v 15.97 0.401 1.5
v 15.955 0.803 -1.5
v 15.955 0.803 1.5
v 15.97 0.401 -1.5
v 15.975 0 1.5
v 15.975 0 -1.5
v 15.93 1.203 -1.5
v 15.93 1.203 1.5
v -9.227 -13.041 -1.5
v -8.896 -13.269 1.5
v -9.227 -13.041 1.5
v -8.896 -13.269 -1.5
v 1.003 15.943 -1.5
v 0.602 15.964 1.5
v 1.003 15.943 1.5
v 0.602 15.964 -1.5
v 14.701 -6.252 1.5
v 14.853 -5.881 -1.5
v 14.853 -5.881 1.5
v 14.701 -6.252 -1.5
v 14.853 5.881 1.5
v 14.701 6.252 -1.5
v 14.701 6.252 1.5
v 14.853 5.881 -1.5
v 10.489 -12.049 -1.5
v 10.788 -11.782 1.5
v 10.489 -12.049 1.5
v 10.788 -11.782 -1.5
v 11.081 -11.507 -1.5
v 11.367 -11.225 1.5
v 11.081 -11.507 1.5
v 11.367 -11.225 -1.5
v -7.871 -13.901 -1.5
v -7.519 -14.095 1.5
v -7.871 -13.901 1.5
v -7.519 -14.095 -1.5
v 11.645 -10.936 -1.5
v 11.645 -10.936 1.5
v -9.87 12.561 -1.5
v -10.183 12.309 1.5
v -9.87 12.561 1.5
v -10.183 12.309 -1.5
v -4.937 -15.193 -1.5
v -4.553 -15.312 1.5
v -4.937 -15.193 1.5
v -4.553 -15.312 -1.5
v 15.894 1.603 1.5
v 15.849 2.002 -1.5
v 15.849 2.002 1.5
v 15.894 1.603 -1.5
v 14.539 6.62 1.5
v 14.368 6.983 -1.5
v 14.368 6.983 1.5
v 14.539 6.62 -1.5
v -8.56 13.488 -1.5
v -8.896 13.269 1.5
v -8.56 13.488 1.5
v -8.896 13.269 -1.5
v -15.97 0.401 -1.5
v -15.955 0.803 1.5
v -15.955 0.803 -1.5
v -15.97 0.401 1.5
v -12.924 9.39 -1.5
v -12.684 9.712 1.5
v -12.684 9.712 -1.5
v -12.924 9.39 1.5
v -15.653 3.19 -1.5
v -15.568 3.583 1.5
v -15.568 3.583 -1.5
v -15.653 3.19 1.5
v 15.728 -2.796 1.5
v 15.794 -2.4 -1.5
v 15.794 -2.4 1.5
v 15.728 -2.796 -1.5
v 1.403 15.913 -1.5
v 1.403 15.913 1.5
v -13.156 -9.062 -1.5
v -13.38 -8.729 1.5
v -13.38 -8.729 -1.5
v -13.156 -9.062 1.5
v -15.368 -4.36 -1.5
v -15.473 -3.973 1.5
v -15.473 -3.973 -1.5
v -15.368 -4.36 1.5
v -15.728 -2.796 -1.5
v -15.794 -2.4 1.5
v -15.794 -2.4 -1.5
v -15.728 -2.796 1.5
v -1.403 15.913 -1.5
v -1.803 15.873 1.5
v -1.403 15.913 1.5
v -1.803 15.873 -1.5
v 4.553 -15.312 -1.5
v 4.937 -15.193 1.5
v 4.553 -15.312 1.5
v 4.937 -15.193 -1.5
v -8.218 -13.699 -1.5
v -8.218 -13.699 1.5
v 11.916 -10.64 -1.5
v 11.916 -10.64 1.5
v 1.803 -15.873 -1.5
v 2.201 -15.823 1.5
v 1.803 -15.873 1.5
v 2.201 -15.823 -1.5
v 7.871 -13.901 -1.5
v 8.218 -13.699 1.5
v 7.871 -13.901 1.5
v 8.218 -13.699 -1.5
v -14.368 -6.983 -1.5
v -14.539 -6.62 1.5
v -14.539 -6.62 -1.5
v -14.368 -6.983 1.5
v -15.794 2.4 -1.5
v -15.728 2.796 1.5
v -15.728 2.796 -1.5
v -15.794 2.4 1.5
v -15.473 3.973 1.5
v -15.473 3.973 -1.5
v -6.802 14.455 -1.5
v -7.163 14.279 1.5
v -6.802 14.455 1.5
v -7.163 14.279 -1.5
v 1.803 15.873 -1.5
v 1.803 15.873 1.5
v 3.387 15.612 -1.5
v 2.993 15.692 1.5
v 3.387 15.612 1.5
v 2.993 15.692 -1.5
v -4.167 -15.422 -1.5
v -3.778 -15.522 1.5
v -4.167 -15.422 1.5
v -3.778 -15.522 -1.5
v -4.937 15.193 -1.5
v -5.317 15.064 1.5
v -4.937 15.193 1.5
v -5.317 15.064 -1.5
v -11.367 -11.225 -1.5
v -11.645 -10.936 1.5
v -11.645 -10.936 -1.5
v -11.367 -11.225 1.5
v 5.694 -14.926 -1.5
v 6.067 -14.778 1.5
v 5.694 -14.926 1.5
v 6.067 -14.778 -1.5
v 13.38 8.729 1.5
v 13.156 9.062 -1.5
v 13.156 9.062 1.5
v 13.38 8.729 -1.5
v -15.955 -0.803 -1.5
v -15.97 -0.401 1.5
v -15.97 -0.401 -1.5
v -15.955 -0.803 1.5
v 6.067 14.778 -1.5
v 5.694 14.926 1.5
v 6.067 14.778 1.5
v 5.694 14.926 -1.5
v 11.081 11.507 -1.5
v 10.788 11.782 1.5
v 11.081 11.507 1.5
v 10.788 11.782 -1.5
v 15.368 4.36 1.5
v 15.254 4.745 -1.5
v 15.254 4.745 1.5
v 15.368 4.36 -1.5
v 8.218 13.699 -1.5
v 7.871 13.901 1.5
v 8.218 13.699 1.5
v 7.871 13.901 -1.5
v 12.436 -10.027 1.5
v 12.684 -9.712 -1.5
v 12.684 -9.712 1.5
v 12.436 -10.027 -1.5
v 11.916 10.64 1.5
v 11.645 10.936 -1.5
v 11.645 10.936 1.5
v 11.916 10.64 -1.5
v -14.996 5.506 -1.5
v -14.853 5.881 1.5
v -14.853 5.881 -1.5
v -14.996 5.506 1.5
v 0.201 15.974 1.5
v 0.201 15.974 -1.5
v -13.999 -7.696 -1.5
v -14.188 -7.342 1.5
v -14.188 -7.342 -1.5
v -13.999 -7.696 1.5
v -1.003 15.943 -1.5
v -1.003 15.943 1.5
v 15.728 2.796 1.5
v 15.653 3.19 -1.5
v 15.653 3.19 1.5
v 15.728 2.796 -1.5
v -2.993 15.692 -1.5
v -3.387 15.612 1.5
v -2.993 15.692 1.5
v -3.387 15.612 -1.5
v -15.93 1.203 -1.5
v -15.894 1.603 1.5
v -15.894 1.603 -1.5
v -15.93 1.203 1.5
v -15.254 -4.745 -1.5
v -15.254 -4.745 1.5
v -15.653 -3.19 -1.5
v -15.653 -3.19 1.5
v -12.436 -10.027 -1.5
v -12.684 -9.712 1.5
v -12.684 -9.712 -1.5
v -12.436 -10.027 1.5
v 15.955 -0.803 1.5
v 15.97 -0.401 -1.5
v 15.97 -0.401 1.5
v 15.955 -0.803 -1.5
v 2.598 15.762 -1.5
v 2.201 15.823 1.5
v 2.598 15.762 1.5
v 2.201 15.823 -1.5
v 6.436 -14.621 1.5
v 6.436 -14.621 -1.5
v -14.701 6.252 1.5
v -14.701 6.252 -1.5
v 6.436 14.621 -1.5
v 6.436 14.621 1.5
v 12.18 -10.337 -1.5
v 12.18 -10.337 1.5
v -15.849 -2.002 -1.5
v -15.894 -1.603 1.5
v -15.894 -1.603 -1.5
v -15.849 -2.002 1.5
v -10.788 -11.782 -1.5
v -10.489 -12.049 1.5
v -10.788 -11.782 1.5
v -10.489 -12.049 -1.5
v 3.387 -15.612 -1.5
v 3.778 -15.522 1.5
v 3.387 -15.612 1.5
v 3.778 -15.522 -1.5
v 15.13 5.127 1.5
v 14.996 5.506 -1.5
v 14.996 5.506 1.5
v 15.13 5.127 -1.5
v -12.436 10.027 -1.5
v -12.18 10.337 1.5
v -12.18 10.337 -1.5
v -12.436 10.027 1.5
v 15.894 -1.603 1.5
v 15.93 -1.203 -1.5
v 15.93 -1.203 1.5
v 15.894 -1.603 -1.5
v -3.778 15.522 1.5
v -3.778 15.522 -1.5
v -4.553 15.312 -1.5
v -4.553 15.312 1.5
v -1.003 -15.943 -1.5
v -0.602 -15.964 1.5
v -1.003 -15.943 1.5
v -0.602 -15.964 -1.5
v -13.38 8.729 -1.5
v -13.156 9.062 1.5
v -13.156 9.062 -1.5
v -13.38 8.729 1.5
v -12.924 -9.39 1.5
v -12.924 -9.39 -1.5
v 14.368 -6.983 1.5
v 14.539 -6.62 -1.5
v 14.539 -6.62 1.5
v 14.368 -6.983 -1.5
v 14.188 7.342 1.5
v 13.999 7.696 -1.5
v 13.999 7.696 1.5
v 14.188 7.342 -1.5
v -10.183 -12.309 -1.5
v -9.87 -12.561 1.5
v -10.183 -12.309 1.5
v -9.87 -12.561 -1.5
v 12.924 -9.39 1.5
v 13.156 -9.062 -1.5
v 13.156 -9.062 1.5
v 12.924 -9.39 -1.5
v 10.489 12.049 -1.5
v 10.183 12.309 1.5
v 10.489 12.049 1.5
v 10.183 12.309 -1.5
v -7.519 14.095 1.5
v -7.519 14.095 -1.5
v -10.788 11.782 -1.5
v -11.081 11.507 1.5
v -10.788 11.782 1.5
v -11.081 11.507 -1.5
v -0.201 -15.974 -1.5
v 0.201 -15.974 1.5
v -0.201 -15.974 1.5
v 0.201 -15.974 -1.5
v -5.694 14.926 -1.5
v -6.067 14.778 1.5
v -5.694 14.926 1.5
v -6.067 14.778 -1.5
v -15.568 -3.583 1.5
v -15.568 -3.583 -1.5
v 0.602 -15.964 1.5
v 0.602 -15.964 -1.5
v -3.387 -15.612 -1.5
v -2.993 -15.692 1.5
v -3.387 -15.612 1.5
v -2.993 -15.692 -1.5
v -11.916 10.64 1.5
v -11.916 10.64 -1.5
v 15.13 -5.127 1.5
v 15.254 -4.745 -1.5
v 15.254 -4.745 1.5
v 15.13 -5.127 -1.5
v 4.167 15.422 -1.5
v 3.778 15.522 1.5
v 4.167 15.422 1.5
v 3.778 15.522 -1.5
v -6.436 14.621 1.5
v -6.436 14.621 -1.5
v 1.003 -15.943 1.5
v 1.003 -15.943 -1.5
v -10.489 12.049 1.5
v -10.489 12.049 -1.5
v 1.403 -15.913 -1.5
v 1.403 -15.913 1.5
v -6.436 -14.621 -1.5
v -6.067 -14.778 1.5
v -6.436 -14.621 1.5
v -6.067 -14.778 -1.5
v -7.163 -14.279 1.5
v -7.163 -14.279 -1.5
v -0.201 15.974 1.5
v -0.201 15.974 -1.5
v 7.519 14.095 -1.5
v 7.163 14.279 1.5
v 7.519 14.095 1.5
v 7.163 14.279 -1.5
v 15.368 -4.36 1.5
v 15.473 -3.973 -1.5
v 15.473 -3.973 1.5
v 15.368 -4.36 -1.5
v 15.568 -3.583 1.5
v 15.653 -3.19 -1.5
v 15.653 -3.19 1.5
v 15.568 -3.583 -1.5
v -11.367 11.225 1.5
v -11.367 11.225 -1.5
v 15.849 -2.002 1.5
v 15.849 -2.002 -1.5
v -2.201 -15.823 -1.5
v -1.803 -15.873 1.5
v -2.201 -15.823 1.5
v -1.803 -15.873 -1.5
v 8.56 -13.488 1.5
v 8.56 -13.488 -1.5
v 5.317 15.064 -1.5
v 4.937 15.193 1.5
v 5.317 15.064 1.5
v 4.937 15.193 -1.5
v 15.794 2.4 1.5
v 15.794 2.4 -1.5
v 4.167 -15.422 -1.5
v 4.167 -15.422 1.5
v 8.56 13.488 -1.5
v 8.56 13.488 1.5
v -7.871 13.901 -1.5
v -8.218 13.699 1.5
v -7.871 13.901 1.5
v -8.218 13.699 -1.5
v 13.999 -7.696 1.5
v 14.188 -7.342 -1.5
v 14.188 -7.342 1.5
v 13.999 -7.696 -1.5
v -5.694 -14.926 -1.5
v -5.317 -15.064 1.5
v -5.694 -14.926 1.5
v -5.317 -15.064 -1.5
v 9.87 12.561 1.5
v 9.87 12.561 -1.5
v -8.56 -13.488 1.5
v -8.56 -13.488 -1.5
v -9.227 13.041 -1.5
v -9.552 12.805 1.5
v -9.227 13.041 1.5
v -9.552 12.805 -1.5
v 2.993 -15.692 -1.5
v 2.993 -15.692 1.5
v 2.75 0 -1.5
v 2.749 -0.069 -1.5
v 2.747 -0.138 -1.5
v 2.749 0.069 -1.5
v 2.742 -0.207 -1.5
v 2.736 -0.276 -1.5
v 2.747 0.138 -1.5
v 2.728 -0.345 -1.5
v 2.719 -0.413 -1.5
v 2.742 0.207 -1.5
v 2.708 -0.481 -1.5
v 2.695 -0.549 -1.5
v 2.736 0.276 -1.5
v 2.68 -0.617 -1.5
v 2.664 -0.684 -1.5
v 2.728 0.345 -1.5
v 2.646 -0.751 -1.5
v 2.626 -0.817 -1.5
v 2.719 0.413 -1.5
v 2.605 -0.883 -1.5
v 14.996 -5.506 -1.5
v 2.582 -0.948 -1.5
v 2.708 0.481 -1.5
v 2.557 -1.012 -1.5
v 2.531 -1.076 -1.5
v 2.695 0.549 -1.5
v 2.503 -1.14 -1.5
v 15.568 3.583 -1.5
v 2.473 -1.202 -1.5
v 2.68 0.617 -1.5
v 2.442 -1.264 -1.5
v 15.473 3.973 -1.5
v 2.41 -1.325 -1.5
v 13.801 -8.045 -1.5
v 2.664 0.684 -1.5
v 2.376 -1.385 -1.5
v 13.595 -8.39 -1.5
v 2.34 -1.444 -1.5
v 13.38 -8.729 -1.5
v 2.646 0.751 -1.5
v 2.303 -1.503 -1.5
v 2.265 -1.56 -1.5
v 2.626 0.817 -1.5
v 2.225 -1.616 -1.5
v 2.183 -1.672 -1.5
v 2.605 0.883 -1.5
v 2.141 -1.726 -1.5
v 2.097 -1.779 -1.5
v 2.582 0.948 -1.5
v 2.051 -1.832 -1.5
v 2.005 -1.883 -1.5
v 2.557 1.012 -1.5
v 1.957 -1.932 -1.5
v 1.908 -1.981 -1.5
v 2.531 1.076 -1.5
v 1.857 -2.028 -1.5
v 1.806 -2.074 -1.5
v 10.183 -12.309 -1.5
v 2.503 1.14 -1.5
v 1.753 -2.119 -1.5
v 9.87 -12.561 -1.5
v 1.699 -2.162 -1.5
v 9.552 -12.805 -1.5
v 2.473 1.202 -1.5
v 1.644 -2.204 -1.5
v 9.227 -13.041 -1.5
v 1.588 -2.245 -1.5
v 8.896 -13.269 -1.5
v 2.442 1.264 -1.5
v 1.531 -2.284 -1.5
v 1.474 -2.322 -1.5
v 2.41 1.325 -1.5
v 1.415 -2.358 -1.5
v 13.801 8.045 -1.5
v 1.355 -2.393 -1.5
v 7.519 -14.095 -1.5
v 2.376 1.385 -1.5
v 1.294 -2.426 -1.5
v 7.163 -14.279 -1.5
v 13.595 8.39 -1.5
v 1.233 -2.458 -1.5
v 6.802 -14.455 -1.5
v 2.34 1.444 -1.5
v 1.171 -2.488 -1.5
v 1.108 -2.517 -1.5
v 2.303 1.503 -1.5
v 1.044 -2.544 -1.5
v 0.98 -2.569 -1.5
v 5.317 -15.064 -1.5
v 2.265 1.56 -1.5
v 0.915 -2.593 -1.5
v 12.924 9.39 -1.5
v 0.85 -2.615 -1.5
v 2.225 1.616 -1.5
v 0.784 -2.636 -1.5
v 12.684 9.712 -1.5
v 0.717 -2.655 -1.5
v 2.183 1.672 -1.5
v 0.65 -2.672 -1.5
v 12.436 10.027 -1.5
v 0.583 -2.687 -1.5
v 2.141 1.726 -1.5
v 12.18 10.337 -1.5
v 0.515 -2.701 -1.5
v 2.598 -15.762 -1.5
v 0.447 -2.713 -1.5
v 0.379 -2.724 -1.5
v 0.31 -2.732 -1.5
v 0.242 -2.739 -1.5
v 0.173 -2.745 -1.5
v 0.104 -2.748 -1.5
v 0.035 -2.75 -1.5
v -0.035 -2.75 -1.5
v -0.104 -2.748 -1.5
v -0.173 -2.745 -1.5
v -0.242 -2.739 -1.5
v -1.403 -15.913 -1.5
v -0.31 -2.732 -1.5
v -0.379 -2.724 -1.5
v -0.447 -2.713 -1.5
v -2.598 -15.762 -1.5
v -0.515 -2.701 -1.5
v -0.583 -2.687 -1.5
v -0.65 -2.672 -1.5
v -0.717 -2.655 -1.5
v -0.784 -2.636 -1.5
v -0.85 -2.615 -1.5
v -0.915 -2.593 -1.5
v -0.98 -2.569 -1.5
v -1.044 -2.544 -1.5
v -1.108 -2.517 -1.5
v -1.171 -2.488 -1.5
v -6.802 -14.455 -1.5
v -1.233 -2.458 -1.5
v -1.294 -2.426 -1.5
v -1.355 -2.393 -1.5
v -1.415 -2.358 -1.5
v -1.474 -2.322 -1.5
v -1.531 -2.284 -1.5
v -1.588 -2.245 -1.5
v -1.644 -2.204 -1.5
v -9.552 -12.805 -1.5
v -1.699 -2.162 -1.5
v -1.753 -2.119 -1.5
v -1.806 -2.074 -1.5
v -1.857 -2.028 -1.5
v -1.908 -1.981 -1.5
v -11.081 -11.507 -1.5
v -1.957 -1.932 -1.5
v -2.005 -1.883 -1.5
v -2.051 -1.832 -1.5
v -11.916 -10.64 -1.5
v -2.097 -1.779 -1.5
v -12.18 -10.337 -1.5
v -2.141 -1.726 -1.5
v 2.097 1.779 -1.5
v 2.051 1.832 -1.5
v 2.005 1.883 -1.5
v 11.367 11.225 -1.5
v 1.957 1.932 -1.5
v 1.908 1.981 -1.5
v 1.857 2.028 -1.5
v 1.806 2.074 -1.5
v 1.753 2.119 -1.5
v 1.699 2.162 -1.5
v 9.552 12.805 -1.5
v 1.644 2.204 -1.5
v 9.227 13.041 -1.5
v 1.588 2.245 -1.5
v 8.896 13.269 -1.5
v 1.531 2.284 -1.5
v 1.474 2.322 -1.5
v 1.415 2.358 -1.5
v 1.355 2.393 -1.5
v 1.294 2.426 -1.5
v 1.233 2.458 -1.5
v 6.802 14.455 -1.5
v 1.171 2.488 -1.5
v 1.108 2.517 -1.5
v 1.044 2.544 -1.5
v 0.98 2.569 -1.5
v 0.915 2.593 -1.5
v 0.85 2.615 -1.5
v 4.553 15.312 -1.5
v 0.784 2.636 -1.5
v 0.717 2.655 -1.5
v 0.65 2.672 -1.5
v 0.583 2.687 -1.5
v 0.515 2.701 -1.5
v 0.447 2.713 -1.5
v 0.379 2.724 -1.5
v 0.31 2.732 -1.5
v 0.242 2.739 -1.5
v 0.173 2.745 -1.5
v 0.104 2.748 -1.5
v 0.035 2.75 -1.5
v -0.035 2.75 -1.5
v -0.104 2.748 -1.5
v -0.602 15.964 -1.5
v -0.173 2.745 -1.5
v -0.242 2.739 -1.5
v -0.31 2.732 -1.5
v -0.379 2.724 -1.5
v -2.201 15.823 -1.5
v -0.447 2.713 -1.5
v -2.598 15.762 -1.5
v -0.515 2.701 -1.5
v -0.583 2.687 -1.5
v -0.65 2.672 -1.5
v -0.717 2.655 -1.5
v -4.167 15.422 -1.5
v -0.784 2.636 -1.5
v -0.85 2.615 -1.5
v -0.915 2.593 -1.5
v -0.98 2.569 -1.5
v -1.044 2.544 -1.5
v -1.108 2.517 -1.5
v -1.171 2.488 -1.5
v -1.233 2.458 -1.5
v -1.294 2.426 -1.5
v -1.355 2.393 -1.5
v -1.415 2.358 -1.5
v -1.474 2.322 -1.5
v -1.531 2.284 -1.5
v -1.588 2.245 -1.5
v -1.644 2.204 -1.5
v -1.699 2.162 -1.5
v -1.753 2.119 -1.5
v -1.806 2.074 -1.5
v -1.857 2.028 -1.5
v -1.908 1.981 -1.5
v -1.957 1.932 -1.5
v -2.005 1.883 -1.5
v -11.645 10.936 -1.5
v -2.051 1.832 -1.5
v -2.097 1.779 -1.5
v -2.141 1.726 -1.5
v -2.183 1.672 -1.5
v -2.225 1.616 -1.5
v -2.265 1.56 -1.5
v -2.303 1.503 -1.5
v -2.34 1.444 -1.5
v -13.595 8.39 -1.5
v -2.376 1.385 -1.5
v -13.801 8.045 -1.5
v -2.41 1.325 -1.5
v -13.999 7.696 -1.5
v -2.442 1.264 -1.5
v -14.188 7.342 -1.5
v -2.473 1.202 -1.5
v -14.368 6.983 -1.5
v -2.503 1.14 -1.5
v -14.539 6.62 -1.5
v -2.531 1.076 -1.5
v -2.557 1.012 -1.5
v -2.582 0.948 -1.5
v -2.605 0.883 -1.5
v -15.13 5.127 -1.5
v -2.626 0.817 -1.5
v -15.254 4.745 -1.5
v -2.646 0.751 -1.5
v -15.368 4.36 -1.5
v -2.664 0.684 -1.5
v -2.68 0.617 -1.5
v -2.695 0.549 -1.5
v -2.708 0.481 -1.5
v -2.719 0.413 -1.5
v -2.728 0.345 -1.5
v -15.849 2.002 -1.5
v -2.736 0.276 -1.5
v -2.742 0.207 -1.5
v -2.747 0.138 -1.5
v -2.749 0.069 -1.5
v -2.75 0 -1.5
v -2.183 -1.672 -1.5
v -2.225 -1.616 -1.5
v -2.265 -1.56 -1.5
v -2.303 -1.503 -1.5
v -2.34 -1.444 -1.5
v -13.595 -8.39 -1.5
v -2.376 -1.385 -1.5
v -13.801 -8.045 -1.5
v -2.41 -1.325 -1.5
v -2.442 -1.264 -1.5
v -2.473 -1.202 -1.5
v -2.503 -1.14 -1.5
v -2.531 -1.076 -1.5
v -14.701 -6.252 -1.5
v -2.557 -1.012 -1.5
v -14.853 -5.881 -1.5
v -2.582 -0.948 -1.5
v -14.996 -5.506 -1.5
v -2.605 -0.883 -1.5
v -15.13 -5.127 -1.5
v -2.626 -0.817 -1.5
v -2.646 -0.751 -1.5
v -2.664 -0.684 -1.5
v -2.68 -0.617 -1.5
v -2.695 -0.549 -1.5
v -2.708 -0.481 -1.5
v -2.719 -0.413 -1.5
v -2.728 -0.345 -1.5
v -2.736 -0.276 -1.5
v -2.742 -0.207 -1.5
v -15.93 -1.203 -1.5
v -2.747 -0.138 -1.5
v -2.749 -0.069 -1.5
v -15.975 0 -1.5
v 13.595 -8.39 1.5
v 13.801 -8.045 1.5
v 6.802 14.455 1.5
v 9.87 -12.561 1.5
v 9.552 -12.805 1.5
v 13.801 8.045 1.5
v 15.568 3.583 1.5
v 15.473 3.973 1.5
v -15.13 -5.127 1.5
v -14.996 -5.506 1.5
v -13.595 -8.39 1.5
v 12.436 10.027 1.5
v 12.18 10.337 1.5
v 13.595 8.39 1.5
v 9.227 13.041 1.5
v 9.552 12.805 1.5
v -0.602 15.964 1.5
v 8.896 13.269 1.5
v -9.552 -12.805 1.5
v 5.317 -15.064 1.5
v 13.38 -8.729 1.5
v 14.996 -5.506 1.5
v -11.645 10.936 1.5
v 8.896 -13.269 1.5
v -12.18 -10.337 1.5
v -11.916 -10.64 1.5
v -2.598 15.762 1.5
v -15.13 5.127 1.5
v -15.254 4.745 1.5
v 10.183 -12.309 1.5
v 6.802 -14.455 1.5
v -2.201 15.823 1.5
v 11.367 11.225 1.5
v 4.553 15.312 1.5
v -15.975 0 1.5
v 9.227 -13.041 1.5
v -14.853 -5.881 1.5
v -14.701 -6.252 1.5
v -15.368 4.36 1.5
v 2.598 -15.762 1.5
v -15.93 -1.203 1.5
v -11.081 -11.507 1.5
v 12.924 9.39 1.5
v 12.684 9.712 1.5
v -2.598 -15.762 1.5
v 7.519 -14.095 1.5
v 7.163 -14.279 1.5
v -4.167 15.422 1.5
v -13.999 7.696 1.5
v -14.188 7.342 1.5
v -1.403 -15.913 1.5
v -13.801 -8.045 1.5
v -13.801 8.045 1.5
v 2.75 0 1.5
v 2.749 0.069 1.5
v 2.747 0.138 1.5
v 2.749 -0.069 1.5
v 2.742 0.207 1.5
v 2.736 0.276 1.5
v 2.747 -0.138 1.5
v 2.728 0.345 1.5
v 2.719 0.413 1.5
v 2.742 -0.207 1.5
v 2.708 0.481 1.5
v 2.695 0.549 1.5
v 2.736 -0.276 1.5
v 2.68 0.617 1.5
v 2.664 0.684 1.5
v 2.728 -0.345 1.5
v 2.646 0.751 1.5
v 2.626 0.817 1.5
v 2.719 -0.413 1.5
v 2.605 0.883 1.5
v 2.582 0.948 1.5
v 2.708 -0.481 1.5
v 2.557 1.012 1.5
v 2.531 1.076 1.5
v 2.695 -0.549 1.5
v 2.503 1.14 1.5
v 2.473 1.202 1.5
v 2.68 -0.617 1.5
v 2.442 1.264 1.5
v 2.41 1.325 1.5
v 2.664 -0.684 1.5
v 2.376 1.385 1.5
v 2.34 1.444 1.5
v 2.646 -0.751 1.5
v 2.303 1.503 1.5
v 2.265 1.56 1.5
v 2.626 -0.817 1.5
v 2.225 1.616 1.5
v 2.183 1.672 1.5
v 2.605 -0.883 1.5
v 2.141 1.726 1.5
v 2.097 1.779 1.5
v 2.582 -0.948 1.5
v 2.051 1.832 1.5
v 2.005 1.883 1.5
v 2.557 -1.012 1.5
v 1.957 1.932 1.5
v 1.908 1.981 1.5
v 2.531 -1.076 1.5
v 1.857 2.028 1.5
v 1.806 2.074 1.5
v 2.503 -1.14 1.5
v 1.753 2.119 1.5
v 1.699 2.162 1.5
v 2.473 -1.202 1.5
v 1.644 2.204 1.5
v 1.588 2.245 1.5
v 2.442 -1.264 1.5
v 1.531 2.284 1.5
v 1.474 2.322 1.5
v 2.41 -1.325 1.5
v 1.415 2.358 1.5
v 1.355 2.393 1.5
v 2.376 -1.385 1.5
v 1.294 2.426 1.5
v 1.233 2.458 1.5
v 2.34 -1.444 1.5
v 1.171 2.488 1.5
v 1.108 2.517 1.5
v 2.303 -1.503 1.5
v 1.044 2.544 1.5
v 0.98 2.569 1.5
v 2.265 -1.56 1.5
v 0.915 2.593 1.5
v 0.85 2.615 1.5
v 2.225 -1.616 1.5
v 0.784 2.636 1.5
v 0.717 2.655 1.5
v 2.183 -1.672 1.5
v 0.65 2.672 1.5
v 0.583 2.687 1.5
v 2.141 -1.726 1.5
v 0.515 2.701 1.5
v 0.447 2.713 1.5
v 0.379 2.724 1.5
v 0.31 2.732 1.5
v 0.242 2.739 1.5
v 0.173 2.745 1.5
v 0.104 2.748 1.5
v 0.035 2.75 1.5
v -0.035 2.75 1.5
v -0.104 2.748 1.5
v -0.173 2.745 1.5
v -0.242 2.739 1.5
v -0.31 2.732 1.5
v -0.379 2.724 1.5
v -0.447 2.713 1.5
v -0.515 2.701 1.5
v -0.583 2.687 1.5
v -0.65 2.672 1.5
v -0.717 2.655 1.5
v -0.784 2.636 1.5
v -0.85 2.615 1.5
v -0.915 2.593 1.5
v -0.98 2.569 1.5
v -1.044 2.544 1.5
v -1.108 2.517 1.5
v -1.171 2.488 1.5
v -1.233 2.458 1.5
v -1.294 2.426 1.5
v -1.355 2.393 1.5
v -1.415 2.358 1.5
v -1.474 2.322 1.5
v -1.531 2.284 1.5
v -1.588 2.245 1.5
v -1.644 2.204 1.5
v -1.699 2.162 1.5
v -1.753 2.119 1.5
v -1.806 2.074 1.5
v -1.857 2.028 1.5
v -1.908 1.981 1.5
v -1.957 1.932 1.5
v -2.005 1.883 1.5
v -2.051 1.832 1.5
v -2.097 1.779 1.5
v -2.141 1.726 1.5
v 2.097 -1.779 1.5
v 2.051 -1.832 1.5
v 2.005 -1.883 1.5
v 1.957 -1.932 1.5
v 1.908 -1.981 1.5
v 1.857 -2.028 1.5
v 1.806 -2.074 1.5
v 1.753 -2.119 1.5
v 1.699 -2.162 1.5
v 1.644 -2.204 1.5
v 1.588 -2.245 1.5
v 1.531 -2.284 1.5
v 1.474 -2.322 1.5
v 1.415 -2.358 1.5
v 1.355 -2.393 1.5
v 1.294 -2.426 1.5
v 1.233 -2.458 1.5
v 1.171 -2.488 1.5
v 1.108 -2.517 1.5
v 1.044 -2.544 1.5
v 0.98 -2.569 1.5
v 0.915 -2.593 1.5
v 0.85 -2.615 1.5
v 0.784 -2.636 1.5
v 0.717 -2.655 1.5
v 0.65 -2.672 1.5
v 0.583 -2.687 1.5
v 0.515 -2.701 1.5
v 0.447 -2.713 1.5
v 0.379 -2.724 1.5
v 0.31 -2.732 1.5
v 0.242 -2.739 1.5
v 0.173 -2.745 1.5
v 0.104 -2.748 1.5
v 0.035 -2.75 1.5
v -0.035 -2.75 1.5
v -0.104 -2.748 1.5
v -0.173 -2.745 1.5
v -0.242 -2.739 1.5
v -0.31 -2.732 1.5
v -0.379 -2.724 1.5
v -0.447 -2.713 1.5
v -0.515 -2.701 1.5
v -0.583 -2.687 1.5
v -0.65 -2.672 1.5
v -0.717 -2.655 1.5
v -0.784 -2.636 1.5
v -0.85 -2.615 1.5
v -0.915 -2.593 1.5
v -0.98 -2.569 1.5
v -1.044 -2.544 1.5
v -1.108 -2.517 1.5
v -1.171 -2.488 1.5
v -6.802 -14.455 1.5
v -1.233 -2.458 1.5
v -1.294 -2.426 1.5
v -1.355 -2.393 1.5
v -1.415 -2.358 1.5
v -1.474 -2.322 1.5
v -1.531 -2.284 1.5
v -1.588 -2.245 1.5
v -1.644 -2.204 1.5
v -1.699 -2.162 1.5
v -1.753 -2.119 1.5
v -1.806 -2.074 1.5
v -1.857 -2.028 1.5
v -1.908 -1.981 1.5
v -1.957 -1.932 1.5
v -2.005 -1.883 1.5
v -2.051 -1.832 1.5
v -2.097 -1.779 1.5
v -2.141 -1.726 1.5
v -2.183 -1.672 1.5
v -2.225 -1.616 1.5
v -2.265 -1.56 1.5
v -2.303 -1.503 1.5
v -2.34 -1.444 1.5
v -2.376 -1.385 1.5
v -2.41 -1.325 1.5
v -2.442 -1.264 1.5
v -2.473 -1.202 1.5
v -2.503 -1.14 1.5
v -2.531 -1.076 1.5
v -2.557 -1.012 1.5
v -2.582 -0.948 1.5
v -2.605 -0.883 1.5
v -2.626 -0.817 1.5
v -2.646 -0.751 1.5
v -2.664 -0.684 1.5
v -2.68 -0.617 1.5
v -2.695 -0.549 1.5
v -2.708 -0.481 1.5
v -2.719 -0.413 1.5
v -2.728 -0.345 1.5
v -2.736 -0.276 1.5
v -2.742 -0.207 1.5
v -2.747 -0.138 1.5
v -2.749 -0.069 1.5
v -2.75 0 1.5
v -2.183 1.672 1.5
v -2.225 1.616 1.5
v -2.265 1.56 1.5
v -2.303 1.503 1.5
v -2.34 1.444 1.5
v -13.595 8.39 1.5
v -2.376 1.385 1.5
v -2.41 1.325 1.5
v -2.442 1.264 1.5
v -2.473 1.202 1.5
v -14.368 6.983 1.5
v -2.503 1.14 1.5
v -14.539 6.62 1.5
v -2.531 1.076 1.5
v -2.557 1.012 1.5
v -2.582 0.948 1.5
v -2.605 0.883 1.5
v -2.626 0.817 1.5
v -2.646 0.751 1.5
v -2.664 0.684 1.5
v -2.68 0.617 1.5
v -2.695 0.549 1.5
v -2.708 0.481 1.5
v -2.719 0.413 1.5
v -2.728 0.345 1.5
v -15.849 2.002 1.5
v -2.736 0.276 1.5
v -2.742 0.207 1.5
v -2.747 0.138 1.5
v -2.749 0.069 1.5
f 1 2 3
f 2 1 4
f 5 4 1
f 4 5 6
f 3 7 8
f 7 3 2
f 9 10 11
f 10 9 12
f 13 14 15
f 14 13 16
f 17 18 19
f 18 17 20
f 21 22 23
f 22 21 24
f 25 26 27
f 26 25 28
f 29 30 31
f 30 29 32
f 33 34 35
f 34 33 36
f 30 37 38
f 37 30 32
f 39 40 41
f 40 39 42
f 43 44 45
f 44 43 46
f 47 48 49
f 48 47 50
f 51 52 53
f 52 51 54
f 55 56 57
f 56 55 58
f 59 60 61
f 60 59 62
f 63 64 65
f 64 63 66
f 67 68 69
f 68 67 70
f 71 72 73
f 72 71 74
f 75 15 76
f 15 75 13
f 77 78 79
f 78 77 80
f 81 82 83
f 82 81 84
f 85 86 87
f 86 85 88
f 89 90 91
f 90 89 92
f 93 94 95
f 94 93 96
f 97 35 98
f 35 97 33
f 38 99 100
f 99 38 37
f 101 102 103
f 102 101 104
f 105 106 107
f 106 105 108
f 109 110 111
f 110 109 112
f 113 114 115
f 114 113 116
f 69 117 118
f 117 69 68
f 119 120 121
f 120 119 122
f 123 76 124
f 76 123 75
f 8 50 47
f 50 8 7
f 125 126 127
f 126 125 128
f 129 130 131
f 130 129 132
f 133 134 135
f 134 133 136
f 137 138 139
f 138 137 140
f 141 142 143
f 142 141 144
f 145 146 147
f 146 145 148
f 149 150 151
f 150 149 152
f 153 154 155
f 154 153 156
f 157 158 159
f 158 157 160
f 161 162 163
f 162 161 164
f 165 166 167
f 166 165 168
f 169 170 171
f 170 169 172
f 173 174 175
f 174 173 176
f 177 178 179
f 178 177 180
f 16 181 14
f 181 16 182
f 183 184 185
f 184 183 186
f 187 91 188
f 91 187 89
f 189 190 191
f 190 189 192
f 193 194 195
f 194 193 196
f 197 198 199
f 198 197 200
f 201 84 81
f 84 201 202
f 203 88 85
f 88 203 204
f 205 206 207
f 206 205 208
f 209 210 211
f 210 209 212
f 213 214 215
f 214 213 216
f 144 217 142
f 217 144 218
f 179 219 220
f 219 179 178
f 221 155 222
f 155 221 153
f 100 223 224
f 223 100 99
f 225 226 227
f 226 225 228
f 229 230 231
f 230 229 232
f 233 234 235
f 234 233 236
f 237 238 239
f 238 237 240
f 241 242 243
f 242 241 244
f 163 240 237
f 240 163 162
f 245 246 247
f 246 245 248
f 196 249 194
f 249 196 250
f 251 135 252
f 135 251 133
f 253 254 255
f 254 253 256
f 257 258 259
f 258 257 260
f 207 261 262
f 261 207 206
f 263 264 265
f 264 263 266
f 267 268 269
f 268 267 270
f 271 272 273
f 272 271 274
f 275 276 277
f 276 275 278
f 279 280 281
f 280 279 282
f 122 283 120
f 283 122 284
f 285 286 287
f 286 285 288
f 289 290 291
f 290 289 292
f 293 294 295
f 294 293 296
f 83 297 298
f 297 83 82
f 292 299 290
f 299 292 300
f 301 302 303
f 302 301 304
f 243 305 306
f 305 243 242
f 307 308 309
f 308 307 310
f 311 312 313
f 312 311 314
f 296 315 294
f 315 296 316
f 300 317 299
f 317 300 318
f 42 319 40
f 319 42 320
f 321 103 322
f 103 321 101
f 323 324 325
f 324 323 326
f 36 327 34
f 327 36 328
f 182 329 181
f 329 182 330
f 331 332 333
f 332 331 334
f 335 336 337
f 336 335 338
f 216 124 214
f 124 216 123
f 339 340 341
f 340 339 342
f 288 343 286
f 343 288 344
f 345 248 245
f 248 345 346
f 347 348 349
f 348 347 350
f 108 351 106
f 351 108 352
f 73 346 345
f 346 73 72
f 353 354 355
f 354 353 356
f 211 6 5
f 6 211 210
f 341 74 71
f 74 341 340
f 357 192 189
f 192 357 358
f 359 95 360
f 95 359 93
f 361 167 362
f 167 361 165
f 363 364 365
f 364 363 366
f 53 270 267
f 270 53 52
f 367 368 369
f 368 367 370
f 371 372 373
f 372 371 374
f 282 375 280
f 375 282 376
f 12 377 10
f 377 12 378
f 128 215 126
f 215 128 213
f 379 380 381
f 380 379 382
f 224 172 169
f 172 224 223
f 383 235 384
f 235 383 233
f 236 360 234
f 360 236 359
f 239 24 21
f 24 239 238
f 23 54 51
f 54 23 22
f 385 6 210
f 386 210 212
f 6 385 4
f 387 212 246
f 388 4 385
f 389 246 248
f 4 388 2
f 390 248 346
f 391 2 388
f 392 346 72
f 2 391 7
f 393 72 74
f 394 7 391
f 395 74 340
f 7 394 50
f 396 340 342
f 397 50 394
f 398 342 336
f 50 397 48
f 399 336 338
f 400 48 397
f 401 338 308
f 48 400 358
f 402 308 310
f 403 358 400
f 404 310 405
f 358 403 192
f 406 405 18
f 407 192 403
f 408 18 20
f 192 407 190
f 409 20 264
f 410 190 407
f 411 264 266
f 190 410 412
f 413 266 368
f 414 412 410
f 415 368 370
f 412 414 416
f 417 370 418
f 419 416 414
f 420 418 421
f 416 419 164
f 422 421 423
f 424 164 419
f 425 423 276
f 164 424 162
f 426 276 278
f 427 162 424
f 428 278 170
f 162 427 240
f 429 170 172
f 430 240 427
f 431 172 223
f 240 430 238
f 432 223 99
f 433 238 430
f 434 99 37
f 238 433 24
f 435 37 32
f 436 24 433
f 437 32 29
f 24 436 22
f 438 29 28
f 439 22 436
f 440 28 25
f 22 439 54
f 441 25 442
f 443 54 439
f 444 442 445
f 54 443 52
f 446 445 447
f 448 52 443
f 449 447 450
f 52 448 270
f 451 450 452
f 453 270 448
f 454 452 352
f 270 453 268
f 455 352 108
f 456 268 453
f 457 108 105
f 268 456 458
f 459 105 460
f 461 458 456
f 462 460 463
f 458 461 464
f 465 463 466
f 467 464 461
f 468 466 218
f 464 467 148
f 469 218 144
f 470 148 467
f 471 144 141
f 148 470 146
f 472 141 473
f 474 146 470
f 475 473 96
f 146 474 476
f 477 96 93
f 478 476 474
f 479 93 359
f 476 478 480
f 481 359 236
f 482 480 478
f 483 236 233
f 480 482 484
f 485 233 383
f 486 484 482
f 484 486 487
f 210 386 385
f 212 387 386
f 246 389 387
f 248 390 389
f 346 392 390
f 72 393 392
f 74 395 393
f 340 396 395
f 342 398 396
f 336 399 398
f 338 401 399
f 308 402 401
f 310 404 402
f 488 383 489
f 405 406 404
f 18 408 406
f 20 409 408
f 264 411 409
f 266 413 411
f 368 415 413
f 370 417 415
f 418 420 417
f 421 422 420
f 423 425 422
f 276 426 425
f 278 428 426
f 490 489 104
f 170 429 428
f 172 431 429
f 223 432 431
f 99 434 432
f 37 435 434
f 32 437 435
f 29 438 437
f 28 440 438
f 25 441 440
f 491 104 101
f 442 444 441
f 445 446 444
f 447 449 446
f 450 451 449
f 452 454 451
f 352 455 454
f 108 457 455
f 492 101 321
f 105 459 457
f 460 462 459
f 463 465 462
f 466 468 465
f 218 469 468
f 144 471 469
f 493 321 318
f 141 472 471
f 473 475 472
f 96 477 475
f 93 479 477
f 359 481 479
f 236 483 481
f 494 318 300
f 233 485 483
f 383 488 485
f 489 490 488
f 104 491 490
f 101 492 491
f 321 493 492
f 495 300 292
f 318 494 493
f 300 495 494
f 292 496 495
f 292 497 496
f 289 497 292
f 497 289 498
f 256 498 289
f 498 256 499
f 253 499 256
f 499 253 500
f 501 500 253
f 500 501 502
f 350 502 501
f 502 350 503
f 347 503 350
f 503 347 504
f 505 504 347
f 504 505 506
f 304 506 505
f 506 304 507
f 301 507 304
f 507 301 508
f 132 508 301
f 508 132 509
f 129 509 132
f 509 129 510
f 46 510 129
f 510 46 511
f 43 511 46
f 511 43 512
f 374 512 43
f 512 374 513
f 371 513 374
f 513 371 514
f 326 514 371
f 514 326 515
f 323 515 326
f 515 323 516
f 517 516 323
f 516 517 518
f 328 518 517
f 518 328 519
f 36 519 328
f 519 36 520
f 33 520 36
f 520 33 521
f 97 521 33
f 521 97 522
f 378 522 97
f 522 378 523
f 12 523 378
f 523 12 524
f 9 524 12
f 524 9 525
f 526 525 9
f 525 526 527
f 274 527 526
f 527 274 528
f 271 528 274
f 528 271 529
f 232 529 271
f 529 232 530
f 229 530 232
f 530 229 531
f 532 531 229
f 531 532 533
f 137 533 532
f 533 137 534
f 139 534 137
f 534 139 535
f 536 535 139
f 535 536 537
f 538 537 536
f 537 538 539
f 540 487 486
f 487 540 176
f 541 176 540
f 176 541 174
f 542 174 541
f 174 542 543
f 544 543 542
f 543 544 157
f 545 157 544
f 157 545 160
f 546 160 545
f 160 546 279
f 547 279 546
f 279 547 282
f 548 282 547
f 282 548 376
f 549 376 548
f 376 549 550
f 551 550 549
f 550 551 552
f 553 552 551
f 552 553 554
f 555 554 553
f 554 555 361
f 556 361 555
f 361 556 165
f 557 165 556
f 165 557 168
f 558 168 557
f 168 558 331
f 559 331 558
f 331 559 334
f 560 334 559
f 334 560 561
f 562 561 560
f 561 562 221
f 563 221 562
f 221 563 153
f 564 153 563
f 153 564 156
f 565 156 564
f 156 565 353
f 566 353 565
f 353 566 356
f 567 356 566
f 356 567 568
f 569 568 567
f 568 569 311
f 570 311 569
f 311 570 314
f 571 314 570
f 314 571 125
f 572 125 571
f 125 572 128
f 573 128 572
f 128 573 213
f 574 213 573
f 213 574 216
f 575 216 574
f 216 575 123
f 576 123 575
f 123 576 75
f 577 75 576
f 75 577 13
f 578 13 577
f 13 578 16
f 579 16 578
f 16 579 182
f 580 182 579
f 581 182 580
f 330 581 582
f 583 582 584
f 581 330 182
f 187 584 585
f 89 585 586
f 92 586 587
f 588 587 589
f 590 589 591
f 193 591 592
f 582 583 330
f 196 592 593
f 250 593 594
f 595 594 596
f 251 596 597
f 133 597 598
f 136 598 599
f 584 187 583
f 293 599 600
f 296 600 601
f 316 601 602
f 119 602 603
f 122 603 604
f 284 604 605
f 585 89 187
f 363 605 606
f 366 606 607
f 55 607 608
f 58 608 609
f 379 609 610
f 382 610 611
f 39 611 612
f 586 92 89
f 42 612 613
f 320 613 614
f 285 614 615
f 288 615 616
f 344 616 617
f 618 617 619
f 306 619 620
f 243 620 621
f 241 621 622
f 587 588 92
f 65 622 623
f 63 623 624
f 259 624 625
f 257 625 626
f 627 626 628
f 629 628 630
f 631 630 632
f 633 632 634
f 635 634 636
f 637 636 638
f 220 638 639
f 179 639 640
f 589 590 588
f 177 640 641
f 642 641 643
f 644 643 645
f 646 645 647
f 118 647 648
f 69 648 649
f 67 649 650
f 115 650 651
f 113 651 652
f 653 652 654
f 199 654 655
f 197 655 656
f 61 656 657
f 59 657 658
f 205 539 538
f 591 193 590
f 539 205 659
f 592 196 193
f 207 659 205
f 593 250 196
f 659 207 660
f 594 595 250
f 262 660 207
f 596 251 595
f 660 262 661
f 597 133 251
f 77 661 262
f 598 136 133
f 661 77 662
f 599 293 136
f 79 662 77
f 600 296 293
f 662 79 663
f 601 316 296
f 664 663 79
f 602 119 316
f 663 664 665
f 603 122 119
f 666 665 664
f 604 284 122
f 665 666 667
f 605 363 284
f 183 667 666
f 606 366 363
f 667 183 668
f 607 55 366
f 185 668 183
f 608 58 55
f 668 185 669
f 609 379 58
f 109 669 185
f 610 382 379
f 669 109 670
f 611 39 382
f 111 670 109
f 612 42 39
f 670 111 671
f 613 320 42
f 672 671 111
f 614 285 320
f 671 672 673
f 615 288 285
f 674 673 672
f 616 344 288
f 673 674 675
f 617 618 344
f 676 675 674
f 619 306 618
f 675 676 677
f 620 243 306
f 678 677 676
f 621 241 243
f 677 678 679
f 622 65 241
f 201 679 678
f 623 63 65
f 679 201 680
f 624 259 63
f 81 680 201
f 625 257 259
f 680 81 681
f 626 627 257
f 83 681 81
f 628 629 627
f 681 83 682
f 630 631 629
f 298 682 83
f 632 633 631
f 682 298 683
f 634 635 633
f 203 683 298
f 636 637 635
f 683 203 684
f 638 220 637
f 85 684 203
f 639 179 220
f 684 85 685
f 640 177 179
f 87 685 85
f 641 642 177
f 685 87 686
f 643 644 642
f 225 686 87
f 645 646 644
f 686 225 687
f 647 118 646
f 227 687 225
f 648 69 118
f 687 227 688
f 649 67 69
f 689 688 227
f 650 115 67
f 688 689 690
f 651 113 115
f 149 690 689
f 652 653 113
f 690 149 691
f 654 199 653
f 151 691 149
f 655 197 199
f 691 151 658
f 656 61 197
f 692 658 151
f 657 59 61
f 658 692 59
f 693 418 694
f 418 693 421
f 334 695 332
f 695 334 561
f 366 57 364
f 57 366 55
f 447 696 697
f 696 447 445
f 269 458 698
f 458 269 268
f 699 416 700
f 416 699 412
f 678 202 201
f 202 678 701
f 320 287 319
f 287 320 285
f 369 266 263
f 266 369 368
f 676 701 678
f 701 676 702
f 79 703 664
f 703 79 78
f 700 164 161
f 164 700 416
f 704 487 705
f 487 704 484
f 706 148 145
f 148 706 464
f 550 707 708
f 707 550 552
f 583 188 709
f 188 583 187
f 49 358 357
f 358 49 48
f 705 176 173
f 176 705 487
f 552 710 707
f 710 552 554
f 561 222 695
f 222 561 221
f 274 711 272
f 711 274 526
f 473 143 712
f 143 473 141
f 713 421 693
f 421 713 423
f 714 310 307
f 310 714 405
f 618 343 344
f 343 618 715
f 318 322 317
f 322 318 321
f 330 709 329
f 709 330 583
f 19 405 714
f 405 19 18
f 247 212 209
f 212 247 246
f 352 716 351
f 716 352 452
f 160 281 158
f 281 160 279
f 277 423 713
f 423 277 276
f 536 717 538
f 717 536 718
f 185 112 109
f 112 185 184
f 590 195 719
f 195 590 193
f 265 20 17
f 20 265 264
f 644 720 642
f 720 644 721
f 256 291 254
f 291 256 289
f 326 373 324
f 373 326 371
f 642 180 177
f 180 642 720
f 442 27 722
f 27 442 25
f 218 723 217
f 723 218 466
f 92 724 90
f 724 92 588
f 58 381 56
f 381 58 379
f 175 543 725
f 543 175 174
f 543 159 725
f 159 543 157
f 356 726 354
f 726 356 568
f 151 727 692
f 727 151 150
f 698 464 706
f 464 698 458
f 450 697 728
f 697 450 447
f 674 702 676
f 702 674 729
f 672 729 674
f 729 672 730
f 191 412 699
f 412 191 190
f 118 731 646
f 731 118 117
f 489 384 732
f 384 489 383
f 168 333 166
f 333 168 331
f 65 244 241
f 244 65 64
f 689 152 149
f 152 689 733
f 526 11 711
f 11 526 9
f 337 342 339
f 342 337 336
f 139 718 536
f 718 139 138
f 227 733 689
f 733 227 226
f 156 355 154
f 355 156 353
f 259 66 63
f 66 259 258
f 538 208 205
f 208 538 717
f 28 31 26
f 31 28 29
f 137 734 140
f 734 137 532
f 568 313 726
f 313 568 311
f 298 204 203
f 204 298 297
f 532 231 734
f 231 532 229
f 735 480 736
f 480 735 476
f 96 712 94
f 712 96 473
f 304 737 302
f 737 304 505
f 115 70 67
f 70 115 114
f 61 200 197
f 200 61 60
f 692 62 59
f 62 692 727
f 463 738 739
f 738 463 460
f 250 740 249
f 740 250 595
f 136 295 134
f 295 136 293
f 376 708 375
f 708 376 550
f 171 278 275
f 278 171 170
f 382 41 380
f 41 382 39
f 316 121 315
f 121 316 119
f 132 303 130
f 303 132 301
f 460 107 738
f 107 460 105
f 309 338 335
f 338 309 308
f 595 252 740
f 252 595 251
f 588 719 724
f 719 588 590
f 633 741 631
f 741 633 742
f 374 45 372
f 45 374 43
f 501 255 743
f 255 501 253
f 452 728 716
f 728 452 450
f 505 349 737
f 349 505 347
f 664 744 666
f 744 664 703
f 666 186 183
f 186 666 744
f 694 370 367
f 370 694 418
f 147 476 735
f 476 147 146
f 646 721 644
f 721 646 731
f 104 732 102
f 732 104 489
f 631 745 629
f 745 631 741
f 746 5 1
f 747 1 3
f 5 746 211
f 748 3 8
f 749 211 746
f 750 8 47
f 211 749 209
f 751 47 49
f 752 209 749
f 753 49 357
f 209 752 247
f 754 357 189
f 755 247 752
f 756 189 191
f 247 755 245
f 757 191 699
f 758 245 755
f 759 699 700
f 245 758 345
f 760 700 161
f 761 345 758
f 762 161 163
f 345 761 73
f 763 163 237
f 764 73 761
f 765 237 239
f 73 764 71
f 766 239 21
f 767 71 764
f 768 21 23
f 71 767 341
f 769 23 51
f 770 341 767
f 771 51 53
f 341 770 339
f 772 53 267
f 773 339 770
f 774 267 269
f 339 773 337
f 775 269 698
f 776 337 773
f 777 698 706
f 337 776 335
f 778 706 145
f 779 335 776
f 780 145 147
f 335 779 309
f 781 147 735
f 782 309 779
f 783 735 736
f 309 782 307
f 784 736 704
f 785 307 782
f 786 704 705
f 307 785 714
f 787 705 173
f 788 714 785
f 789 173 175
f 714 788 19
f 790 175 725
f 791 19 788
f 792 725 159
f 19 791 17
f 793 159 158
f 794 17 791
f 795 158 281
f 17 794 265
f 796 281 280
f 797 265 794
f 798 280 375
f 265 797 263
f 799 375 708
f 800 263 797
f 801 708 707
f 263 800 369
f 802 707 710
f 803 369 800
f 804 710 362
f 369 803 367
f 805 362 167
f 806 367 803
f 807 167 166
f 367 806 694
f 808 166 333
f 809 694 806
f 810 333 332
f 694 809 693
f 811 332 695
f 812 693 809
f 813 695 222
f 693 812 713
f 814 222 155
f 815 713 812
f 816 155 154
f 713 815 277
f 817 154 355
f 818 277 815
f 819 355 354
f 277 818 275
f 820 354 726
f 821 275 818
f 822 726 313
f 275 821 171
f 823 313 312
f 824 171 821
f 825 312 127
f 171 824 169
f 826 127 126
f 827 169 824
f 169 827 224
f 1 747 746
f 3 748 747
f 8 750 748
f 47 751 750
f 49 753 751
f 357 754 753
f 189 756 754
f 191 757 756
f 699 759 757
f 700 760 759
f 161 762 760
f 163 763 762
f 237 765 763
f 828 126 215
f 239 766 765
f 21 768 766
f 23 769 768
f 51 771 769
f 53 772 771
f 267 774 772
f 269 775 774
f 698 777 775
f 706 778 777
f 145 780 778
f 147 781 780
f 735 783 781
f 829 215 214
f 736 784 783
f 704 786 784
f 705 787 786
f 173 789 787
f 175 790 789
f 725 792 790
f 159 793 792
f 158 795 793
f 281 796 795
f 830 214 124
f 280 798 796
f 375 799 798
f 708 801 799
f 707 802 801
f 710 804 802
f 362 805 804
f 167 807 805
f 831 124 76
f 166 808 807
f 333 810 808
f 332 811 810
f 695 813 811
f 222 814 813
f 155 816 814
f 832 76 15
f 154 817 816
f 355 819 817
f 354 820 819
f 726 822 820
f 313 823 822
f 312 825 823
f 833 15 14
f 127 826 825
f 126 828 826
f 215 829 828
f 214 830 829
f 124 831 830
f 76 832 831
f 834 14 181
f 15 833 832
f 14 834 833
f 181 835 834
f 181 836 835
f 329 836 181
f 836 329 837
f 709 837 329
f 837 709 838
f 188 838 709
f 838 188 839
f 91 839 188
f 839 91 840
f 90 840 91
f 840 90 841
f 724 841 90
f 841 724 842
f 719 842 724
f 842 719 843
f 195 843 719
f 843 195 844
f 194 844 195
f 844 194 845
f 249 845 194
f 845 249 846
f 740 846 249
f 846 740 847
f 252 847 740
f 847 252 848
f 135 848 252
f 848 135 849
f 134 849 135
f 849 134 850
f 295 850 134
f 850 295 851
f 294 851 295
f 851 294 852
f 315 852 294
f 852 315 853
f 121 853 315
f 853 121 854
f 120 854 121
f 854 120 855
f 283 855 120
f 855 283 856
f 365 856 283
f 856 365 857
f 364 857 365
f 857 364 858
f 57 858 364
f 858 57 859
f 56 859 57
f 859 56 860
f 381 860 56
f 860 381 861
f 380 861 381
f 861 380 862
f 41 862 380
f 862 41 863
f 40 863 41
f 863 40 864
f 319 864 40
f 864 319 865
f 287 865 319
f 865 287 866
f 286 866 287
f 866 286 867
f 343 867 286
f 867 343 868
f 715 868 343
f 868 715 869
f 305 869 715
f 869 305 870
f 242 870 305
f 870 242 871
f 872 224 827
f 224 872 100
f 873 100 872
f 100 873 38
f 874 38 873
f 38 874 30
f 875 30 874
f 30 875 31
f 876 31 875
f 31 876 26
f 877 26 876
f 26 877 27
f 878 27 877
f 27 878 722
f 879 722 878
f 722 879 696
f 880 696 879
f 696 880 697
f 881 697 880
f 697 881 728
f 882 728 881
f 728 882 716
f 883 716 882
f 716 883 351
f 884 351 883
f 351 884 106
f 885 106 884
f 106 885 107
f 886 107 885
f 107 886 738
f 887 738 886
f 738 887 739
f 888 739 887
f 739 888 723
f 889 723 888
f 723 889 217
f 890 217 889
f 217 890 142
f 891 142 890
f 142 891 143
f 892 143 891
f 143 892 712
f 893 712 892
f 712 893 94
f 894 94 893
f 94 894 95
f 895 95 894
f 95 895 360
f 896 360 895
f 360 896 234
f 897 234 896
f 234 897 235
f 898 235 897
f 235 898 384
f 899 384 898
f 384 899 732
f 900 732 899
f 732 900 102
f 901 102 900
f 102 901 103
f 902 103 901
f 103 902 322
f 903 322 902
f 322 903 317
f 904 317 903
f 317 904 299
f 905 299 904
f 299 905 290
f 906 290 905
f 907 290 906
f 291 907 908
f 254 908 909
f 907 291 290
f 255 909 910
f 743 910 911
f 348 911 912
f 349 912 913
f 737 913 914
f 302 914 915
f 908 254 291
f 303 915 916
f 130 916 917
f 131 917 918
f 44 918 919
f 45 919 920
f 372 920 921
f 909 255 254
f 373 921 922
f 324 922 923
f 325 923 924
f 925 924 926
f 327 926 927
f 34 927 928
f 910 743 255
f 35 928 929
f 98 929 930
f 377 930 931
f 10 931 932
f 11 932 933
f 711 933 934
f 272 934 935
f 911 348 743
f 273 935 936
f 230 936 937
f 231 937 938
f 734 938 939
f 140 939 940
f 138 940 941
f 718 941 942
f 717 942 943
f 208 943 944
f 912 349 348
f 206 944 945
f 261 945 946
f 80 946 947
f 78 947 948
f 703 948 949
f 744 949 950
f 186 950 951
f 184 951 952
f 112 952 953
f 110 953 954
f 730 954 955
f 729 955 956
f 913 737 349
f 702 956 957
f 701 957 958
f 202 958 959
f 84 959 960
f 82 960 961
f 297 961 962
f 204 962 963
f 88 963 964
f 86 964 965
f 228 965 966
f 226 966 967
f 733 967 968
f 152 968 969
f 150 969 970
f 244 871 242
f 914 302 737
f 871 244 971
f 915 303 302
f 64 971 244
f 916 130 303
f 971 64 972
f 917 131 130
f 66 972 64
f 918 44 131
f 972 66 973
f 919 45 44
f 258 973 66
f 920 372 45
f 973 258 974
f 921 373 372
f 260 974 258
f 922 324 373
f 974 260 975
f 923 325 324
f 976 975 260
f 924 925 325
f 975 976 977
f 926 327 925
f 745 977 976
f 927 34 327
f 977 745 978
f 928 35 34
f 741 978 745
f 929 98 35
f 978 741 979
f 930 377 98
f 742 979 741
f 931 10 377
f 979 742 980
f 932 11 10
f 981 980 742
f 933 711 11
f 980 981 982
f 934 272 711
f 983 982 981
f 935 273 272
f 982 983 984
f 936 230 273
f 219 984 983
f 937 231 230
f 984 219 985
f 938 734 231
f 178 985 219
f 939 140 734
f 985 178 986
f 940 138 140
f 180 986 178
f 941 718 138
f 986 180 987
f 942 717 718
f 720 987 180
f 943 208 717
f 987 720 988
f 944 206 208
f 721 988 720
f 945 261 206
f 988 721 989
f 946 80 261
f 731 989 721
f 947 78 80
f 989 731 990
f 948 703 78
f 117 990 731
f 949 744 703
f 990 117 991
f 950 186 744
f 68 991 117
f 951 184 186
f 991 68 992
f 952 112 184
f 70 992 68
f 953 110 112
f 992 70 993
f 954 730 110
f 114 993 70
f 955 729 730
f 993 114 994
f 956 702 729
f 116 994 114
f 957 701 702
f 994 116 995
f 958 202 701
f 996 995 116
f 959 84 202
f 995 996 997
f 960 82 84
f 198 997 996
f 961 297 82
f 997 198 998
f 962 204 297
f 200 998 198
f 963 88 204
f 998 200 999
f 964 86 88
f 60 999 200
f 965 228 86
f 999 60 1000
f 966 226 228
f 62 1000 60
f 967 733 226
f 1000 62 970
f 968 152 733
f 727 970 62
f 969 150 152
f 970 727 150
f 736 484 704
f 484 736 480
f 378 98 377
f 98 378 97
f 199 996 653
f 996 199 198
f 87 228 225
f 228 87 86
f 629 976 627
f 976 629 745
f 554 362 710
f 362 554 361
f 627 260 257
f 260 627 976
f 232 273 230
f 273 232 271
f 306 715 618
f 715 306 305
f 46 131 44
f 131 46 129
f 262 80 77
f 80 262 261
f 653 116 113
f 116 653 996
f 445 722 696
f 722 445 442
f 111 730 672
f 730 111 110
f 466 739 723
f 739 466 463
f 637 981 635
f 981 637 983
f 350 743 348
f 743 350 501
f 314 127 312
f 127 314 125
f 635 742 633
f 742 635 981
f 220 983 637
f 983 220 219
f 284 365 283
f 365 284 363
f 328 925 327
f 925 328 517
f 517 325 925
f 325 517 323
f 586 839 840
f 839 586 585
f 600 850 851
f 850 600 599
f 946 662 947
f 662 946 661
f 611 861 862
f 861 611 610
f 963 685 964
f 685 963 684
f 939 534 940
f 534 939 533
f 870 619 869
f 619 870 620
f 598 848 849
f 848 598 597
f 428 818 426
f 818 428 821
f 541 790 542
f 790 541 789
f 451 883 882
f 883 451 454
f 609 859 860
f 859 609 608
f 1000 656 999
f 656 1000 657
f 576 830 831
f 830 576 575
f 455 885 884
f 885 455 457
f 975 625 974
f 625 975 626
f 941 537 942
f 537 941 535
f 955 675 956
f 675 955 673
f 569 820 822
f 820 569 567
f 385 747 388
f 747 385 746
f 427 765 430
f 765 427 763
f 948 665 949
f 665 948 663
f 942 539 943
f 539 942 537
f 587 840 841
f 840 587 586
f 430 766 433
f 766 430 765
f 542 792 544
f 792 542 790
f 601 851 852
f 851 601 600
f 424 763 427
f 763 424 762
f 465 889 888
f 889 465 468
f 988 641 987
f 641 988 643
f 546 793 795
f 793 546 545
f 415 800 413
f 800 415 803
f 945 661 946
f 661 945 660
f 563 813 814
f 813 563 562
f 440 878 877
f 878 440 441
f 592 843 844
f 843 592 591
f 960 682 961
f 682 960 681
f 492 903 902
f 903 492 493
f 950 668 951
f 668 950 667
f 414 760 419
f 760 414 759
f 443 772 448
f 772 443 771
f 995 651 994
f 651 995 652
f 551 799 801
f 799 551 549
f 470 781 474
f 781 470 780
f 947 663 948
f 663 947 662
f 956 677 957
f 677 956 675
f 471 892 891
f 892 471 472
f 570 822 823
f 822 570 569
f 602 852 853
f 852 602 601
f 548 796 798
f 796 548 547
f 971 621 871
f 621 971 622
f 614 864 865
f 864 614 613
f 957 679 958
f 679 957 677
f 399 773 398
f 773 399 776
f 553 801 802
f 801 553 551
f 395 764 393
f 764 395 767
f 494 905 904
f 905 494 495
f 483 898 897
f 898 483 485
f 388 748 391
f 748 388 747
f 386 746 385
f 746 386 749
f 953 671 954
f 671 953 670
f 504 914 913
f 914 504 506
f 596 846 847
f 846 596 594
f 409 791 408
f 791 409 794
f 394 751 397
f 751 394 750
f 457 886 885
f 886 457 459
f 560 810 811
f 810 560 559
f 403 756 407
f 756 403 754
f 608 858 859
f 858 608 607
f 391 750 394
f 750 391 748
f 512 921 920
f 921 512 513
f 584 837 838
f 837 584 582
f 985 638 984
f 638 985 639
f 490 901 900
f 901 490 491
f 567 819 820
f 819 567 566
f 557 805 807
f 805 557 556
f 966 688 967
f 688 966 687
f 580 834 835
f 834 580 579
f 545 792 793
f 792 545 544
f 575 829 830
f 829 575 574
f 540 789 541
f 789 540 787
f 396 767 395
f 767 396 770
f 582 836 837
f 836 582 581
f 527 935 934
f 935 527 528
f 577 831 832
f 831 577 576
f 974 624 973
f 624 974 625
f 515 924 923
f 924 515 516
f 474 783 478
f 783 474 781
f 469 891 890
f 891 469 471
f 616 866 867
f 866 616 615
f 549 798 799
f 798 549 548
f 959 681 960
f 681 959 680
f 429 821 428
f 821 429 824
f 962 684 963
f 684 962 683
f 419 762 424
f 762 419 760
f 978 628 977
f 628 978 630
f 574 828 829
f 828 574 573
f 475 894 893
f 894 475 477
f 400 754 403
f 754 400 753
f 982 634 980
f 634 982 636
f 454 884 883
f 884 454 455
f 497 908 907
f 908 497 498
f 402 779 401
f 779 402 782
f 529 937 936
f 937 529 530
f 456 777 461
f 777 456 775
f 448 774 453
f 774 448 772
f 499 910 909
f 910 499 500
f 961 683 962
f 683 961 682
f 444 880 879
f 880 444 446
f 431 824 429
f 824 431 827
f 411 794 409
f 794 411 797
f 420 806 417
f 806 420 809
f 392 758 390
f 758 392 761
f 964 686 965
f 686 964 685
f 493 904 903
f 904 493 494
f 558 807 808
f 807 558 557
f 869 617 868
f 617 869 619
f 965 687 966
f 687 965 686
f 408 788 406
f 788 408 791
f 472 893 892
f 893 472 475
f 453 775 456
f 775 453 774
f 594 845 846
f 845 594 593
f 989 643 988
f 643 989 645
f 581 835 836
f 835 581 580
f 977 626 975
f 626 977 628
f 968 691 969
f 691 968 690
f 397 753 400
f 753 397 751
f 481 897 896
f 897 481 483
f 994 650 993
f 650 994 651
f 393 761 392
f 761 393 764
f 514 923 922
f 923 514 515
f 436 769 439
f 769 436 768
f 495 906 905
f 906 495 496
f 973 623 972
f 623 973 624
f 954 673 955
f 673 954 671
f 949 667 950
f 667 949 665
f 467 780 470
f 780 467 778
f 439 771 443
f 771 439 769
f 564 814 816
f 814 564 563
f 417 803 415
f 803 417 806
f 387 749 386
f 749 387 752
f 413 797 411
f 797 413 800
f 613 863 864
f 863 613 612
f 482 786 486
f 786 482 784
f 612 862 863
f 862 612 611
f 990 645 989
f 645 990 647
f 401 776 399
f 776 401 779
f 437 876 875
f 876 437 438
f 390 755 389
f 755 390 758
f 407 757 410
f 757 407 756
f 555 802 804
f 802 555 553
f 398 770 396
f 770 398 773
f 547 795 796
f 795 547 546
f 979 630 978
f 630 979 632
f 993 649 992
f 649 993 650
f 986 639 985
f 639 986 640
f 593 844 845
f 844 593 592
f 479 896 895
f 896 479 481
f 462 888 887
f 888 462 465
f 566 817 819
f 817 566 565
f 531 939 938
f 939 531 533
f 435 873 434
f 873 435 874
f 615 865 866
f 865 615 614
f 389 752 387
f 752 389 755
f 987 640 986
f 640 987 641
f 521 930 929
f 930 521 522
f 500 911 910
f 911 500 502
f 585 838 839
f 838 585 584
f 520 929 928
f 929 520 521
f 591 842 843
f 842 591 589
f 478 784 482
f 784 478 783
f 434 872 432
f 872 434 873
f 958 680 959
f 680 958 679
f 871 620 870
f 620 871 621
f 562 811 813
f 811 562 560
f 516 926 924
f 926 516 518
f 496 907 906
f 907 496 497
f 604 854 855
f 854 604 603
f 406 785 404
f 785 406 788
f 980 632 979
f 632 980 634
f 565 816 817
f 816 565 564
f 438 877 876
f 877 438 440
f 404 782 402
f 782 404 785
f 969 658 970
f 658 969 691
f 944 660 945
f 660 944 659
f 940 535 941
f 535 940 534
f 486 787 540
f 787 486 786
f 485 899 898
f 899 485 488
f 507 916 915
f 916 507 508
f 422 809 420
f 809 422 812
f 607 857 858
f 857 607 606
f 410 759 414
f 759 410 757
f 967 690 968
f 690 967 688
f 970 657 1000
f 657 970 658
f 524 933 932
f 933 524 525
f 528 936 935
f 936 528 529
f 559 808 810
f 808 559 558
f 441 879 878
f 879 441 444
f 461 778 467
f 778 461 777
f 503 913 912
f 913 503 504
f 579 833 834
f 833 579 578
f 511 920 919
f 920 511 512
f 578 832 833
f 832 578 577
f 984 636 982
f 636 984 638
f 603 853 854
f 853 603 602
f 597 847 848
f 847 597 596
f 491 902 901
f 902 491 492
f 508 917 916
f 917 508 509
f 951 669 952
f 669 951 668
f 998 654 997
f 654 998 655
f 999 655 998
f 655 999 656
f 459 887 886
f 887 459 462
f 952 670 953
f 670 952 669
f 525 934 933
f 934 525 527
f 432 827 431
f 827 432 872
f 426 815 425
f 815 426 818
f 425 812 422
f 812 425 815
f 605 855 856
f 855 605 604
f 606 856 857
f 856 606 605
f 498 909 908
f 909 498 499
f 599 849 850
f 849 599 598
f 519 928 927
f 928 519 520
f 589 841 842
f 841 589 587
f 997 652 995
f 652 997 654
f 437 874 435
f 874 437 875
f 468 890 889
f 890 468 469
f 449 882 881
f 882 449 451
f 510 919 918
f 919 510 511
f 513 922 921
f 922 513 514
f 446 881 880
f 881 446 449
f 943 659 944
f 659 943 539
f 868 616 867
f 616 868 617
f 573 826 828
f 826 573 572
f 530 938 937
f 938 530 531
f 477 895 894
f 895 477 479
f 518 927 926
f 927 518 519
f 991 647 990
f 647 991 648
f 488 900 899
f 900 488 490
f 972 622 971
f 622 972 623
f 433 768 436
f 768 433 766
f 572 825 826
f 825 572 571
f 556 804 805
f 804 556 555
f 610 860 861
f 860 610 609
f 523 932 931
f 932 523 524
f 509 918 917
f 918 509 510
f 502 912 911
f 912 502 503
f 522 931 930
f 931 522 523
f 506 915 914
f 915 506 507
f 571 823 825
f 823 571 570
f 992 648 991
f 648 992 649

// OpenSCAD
// Model purpose: Simple washer/spacer for the shades mechanism, used to tune axial spacing and reduce friction or wobble between moving parts.
// Sized to the same family of shade components so it can be printed quickly as a fit-adjustment consumable.
$fn = 250;
epsilon = 0.01;
PLATE_DIAMETER = 31.95;
PLATE_WIDTH = 3.0;
HOLE_DIAMETER = 5.5;

difference()
{
    cylinder(r = PLATE_DIAMETER / 2, h = PLATE_WIDTH, center = true);
    cylinder(r = HOLE_DIAMETER / 2, h = PLATE_WIDTH + epsilon, center = true);
}
